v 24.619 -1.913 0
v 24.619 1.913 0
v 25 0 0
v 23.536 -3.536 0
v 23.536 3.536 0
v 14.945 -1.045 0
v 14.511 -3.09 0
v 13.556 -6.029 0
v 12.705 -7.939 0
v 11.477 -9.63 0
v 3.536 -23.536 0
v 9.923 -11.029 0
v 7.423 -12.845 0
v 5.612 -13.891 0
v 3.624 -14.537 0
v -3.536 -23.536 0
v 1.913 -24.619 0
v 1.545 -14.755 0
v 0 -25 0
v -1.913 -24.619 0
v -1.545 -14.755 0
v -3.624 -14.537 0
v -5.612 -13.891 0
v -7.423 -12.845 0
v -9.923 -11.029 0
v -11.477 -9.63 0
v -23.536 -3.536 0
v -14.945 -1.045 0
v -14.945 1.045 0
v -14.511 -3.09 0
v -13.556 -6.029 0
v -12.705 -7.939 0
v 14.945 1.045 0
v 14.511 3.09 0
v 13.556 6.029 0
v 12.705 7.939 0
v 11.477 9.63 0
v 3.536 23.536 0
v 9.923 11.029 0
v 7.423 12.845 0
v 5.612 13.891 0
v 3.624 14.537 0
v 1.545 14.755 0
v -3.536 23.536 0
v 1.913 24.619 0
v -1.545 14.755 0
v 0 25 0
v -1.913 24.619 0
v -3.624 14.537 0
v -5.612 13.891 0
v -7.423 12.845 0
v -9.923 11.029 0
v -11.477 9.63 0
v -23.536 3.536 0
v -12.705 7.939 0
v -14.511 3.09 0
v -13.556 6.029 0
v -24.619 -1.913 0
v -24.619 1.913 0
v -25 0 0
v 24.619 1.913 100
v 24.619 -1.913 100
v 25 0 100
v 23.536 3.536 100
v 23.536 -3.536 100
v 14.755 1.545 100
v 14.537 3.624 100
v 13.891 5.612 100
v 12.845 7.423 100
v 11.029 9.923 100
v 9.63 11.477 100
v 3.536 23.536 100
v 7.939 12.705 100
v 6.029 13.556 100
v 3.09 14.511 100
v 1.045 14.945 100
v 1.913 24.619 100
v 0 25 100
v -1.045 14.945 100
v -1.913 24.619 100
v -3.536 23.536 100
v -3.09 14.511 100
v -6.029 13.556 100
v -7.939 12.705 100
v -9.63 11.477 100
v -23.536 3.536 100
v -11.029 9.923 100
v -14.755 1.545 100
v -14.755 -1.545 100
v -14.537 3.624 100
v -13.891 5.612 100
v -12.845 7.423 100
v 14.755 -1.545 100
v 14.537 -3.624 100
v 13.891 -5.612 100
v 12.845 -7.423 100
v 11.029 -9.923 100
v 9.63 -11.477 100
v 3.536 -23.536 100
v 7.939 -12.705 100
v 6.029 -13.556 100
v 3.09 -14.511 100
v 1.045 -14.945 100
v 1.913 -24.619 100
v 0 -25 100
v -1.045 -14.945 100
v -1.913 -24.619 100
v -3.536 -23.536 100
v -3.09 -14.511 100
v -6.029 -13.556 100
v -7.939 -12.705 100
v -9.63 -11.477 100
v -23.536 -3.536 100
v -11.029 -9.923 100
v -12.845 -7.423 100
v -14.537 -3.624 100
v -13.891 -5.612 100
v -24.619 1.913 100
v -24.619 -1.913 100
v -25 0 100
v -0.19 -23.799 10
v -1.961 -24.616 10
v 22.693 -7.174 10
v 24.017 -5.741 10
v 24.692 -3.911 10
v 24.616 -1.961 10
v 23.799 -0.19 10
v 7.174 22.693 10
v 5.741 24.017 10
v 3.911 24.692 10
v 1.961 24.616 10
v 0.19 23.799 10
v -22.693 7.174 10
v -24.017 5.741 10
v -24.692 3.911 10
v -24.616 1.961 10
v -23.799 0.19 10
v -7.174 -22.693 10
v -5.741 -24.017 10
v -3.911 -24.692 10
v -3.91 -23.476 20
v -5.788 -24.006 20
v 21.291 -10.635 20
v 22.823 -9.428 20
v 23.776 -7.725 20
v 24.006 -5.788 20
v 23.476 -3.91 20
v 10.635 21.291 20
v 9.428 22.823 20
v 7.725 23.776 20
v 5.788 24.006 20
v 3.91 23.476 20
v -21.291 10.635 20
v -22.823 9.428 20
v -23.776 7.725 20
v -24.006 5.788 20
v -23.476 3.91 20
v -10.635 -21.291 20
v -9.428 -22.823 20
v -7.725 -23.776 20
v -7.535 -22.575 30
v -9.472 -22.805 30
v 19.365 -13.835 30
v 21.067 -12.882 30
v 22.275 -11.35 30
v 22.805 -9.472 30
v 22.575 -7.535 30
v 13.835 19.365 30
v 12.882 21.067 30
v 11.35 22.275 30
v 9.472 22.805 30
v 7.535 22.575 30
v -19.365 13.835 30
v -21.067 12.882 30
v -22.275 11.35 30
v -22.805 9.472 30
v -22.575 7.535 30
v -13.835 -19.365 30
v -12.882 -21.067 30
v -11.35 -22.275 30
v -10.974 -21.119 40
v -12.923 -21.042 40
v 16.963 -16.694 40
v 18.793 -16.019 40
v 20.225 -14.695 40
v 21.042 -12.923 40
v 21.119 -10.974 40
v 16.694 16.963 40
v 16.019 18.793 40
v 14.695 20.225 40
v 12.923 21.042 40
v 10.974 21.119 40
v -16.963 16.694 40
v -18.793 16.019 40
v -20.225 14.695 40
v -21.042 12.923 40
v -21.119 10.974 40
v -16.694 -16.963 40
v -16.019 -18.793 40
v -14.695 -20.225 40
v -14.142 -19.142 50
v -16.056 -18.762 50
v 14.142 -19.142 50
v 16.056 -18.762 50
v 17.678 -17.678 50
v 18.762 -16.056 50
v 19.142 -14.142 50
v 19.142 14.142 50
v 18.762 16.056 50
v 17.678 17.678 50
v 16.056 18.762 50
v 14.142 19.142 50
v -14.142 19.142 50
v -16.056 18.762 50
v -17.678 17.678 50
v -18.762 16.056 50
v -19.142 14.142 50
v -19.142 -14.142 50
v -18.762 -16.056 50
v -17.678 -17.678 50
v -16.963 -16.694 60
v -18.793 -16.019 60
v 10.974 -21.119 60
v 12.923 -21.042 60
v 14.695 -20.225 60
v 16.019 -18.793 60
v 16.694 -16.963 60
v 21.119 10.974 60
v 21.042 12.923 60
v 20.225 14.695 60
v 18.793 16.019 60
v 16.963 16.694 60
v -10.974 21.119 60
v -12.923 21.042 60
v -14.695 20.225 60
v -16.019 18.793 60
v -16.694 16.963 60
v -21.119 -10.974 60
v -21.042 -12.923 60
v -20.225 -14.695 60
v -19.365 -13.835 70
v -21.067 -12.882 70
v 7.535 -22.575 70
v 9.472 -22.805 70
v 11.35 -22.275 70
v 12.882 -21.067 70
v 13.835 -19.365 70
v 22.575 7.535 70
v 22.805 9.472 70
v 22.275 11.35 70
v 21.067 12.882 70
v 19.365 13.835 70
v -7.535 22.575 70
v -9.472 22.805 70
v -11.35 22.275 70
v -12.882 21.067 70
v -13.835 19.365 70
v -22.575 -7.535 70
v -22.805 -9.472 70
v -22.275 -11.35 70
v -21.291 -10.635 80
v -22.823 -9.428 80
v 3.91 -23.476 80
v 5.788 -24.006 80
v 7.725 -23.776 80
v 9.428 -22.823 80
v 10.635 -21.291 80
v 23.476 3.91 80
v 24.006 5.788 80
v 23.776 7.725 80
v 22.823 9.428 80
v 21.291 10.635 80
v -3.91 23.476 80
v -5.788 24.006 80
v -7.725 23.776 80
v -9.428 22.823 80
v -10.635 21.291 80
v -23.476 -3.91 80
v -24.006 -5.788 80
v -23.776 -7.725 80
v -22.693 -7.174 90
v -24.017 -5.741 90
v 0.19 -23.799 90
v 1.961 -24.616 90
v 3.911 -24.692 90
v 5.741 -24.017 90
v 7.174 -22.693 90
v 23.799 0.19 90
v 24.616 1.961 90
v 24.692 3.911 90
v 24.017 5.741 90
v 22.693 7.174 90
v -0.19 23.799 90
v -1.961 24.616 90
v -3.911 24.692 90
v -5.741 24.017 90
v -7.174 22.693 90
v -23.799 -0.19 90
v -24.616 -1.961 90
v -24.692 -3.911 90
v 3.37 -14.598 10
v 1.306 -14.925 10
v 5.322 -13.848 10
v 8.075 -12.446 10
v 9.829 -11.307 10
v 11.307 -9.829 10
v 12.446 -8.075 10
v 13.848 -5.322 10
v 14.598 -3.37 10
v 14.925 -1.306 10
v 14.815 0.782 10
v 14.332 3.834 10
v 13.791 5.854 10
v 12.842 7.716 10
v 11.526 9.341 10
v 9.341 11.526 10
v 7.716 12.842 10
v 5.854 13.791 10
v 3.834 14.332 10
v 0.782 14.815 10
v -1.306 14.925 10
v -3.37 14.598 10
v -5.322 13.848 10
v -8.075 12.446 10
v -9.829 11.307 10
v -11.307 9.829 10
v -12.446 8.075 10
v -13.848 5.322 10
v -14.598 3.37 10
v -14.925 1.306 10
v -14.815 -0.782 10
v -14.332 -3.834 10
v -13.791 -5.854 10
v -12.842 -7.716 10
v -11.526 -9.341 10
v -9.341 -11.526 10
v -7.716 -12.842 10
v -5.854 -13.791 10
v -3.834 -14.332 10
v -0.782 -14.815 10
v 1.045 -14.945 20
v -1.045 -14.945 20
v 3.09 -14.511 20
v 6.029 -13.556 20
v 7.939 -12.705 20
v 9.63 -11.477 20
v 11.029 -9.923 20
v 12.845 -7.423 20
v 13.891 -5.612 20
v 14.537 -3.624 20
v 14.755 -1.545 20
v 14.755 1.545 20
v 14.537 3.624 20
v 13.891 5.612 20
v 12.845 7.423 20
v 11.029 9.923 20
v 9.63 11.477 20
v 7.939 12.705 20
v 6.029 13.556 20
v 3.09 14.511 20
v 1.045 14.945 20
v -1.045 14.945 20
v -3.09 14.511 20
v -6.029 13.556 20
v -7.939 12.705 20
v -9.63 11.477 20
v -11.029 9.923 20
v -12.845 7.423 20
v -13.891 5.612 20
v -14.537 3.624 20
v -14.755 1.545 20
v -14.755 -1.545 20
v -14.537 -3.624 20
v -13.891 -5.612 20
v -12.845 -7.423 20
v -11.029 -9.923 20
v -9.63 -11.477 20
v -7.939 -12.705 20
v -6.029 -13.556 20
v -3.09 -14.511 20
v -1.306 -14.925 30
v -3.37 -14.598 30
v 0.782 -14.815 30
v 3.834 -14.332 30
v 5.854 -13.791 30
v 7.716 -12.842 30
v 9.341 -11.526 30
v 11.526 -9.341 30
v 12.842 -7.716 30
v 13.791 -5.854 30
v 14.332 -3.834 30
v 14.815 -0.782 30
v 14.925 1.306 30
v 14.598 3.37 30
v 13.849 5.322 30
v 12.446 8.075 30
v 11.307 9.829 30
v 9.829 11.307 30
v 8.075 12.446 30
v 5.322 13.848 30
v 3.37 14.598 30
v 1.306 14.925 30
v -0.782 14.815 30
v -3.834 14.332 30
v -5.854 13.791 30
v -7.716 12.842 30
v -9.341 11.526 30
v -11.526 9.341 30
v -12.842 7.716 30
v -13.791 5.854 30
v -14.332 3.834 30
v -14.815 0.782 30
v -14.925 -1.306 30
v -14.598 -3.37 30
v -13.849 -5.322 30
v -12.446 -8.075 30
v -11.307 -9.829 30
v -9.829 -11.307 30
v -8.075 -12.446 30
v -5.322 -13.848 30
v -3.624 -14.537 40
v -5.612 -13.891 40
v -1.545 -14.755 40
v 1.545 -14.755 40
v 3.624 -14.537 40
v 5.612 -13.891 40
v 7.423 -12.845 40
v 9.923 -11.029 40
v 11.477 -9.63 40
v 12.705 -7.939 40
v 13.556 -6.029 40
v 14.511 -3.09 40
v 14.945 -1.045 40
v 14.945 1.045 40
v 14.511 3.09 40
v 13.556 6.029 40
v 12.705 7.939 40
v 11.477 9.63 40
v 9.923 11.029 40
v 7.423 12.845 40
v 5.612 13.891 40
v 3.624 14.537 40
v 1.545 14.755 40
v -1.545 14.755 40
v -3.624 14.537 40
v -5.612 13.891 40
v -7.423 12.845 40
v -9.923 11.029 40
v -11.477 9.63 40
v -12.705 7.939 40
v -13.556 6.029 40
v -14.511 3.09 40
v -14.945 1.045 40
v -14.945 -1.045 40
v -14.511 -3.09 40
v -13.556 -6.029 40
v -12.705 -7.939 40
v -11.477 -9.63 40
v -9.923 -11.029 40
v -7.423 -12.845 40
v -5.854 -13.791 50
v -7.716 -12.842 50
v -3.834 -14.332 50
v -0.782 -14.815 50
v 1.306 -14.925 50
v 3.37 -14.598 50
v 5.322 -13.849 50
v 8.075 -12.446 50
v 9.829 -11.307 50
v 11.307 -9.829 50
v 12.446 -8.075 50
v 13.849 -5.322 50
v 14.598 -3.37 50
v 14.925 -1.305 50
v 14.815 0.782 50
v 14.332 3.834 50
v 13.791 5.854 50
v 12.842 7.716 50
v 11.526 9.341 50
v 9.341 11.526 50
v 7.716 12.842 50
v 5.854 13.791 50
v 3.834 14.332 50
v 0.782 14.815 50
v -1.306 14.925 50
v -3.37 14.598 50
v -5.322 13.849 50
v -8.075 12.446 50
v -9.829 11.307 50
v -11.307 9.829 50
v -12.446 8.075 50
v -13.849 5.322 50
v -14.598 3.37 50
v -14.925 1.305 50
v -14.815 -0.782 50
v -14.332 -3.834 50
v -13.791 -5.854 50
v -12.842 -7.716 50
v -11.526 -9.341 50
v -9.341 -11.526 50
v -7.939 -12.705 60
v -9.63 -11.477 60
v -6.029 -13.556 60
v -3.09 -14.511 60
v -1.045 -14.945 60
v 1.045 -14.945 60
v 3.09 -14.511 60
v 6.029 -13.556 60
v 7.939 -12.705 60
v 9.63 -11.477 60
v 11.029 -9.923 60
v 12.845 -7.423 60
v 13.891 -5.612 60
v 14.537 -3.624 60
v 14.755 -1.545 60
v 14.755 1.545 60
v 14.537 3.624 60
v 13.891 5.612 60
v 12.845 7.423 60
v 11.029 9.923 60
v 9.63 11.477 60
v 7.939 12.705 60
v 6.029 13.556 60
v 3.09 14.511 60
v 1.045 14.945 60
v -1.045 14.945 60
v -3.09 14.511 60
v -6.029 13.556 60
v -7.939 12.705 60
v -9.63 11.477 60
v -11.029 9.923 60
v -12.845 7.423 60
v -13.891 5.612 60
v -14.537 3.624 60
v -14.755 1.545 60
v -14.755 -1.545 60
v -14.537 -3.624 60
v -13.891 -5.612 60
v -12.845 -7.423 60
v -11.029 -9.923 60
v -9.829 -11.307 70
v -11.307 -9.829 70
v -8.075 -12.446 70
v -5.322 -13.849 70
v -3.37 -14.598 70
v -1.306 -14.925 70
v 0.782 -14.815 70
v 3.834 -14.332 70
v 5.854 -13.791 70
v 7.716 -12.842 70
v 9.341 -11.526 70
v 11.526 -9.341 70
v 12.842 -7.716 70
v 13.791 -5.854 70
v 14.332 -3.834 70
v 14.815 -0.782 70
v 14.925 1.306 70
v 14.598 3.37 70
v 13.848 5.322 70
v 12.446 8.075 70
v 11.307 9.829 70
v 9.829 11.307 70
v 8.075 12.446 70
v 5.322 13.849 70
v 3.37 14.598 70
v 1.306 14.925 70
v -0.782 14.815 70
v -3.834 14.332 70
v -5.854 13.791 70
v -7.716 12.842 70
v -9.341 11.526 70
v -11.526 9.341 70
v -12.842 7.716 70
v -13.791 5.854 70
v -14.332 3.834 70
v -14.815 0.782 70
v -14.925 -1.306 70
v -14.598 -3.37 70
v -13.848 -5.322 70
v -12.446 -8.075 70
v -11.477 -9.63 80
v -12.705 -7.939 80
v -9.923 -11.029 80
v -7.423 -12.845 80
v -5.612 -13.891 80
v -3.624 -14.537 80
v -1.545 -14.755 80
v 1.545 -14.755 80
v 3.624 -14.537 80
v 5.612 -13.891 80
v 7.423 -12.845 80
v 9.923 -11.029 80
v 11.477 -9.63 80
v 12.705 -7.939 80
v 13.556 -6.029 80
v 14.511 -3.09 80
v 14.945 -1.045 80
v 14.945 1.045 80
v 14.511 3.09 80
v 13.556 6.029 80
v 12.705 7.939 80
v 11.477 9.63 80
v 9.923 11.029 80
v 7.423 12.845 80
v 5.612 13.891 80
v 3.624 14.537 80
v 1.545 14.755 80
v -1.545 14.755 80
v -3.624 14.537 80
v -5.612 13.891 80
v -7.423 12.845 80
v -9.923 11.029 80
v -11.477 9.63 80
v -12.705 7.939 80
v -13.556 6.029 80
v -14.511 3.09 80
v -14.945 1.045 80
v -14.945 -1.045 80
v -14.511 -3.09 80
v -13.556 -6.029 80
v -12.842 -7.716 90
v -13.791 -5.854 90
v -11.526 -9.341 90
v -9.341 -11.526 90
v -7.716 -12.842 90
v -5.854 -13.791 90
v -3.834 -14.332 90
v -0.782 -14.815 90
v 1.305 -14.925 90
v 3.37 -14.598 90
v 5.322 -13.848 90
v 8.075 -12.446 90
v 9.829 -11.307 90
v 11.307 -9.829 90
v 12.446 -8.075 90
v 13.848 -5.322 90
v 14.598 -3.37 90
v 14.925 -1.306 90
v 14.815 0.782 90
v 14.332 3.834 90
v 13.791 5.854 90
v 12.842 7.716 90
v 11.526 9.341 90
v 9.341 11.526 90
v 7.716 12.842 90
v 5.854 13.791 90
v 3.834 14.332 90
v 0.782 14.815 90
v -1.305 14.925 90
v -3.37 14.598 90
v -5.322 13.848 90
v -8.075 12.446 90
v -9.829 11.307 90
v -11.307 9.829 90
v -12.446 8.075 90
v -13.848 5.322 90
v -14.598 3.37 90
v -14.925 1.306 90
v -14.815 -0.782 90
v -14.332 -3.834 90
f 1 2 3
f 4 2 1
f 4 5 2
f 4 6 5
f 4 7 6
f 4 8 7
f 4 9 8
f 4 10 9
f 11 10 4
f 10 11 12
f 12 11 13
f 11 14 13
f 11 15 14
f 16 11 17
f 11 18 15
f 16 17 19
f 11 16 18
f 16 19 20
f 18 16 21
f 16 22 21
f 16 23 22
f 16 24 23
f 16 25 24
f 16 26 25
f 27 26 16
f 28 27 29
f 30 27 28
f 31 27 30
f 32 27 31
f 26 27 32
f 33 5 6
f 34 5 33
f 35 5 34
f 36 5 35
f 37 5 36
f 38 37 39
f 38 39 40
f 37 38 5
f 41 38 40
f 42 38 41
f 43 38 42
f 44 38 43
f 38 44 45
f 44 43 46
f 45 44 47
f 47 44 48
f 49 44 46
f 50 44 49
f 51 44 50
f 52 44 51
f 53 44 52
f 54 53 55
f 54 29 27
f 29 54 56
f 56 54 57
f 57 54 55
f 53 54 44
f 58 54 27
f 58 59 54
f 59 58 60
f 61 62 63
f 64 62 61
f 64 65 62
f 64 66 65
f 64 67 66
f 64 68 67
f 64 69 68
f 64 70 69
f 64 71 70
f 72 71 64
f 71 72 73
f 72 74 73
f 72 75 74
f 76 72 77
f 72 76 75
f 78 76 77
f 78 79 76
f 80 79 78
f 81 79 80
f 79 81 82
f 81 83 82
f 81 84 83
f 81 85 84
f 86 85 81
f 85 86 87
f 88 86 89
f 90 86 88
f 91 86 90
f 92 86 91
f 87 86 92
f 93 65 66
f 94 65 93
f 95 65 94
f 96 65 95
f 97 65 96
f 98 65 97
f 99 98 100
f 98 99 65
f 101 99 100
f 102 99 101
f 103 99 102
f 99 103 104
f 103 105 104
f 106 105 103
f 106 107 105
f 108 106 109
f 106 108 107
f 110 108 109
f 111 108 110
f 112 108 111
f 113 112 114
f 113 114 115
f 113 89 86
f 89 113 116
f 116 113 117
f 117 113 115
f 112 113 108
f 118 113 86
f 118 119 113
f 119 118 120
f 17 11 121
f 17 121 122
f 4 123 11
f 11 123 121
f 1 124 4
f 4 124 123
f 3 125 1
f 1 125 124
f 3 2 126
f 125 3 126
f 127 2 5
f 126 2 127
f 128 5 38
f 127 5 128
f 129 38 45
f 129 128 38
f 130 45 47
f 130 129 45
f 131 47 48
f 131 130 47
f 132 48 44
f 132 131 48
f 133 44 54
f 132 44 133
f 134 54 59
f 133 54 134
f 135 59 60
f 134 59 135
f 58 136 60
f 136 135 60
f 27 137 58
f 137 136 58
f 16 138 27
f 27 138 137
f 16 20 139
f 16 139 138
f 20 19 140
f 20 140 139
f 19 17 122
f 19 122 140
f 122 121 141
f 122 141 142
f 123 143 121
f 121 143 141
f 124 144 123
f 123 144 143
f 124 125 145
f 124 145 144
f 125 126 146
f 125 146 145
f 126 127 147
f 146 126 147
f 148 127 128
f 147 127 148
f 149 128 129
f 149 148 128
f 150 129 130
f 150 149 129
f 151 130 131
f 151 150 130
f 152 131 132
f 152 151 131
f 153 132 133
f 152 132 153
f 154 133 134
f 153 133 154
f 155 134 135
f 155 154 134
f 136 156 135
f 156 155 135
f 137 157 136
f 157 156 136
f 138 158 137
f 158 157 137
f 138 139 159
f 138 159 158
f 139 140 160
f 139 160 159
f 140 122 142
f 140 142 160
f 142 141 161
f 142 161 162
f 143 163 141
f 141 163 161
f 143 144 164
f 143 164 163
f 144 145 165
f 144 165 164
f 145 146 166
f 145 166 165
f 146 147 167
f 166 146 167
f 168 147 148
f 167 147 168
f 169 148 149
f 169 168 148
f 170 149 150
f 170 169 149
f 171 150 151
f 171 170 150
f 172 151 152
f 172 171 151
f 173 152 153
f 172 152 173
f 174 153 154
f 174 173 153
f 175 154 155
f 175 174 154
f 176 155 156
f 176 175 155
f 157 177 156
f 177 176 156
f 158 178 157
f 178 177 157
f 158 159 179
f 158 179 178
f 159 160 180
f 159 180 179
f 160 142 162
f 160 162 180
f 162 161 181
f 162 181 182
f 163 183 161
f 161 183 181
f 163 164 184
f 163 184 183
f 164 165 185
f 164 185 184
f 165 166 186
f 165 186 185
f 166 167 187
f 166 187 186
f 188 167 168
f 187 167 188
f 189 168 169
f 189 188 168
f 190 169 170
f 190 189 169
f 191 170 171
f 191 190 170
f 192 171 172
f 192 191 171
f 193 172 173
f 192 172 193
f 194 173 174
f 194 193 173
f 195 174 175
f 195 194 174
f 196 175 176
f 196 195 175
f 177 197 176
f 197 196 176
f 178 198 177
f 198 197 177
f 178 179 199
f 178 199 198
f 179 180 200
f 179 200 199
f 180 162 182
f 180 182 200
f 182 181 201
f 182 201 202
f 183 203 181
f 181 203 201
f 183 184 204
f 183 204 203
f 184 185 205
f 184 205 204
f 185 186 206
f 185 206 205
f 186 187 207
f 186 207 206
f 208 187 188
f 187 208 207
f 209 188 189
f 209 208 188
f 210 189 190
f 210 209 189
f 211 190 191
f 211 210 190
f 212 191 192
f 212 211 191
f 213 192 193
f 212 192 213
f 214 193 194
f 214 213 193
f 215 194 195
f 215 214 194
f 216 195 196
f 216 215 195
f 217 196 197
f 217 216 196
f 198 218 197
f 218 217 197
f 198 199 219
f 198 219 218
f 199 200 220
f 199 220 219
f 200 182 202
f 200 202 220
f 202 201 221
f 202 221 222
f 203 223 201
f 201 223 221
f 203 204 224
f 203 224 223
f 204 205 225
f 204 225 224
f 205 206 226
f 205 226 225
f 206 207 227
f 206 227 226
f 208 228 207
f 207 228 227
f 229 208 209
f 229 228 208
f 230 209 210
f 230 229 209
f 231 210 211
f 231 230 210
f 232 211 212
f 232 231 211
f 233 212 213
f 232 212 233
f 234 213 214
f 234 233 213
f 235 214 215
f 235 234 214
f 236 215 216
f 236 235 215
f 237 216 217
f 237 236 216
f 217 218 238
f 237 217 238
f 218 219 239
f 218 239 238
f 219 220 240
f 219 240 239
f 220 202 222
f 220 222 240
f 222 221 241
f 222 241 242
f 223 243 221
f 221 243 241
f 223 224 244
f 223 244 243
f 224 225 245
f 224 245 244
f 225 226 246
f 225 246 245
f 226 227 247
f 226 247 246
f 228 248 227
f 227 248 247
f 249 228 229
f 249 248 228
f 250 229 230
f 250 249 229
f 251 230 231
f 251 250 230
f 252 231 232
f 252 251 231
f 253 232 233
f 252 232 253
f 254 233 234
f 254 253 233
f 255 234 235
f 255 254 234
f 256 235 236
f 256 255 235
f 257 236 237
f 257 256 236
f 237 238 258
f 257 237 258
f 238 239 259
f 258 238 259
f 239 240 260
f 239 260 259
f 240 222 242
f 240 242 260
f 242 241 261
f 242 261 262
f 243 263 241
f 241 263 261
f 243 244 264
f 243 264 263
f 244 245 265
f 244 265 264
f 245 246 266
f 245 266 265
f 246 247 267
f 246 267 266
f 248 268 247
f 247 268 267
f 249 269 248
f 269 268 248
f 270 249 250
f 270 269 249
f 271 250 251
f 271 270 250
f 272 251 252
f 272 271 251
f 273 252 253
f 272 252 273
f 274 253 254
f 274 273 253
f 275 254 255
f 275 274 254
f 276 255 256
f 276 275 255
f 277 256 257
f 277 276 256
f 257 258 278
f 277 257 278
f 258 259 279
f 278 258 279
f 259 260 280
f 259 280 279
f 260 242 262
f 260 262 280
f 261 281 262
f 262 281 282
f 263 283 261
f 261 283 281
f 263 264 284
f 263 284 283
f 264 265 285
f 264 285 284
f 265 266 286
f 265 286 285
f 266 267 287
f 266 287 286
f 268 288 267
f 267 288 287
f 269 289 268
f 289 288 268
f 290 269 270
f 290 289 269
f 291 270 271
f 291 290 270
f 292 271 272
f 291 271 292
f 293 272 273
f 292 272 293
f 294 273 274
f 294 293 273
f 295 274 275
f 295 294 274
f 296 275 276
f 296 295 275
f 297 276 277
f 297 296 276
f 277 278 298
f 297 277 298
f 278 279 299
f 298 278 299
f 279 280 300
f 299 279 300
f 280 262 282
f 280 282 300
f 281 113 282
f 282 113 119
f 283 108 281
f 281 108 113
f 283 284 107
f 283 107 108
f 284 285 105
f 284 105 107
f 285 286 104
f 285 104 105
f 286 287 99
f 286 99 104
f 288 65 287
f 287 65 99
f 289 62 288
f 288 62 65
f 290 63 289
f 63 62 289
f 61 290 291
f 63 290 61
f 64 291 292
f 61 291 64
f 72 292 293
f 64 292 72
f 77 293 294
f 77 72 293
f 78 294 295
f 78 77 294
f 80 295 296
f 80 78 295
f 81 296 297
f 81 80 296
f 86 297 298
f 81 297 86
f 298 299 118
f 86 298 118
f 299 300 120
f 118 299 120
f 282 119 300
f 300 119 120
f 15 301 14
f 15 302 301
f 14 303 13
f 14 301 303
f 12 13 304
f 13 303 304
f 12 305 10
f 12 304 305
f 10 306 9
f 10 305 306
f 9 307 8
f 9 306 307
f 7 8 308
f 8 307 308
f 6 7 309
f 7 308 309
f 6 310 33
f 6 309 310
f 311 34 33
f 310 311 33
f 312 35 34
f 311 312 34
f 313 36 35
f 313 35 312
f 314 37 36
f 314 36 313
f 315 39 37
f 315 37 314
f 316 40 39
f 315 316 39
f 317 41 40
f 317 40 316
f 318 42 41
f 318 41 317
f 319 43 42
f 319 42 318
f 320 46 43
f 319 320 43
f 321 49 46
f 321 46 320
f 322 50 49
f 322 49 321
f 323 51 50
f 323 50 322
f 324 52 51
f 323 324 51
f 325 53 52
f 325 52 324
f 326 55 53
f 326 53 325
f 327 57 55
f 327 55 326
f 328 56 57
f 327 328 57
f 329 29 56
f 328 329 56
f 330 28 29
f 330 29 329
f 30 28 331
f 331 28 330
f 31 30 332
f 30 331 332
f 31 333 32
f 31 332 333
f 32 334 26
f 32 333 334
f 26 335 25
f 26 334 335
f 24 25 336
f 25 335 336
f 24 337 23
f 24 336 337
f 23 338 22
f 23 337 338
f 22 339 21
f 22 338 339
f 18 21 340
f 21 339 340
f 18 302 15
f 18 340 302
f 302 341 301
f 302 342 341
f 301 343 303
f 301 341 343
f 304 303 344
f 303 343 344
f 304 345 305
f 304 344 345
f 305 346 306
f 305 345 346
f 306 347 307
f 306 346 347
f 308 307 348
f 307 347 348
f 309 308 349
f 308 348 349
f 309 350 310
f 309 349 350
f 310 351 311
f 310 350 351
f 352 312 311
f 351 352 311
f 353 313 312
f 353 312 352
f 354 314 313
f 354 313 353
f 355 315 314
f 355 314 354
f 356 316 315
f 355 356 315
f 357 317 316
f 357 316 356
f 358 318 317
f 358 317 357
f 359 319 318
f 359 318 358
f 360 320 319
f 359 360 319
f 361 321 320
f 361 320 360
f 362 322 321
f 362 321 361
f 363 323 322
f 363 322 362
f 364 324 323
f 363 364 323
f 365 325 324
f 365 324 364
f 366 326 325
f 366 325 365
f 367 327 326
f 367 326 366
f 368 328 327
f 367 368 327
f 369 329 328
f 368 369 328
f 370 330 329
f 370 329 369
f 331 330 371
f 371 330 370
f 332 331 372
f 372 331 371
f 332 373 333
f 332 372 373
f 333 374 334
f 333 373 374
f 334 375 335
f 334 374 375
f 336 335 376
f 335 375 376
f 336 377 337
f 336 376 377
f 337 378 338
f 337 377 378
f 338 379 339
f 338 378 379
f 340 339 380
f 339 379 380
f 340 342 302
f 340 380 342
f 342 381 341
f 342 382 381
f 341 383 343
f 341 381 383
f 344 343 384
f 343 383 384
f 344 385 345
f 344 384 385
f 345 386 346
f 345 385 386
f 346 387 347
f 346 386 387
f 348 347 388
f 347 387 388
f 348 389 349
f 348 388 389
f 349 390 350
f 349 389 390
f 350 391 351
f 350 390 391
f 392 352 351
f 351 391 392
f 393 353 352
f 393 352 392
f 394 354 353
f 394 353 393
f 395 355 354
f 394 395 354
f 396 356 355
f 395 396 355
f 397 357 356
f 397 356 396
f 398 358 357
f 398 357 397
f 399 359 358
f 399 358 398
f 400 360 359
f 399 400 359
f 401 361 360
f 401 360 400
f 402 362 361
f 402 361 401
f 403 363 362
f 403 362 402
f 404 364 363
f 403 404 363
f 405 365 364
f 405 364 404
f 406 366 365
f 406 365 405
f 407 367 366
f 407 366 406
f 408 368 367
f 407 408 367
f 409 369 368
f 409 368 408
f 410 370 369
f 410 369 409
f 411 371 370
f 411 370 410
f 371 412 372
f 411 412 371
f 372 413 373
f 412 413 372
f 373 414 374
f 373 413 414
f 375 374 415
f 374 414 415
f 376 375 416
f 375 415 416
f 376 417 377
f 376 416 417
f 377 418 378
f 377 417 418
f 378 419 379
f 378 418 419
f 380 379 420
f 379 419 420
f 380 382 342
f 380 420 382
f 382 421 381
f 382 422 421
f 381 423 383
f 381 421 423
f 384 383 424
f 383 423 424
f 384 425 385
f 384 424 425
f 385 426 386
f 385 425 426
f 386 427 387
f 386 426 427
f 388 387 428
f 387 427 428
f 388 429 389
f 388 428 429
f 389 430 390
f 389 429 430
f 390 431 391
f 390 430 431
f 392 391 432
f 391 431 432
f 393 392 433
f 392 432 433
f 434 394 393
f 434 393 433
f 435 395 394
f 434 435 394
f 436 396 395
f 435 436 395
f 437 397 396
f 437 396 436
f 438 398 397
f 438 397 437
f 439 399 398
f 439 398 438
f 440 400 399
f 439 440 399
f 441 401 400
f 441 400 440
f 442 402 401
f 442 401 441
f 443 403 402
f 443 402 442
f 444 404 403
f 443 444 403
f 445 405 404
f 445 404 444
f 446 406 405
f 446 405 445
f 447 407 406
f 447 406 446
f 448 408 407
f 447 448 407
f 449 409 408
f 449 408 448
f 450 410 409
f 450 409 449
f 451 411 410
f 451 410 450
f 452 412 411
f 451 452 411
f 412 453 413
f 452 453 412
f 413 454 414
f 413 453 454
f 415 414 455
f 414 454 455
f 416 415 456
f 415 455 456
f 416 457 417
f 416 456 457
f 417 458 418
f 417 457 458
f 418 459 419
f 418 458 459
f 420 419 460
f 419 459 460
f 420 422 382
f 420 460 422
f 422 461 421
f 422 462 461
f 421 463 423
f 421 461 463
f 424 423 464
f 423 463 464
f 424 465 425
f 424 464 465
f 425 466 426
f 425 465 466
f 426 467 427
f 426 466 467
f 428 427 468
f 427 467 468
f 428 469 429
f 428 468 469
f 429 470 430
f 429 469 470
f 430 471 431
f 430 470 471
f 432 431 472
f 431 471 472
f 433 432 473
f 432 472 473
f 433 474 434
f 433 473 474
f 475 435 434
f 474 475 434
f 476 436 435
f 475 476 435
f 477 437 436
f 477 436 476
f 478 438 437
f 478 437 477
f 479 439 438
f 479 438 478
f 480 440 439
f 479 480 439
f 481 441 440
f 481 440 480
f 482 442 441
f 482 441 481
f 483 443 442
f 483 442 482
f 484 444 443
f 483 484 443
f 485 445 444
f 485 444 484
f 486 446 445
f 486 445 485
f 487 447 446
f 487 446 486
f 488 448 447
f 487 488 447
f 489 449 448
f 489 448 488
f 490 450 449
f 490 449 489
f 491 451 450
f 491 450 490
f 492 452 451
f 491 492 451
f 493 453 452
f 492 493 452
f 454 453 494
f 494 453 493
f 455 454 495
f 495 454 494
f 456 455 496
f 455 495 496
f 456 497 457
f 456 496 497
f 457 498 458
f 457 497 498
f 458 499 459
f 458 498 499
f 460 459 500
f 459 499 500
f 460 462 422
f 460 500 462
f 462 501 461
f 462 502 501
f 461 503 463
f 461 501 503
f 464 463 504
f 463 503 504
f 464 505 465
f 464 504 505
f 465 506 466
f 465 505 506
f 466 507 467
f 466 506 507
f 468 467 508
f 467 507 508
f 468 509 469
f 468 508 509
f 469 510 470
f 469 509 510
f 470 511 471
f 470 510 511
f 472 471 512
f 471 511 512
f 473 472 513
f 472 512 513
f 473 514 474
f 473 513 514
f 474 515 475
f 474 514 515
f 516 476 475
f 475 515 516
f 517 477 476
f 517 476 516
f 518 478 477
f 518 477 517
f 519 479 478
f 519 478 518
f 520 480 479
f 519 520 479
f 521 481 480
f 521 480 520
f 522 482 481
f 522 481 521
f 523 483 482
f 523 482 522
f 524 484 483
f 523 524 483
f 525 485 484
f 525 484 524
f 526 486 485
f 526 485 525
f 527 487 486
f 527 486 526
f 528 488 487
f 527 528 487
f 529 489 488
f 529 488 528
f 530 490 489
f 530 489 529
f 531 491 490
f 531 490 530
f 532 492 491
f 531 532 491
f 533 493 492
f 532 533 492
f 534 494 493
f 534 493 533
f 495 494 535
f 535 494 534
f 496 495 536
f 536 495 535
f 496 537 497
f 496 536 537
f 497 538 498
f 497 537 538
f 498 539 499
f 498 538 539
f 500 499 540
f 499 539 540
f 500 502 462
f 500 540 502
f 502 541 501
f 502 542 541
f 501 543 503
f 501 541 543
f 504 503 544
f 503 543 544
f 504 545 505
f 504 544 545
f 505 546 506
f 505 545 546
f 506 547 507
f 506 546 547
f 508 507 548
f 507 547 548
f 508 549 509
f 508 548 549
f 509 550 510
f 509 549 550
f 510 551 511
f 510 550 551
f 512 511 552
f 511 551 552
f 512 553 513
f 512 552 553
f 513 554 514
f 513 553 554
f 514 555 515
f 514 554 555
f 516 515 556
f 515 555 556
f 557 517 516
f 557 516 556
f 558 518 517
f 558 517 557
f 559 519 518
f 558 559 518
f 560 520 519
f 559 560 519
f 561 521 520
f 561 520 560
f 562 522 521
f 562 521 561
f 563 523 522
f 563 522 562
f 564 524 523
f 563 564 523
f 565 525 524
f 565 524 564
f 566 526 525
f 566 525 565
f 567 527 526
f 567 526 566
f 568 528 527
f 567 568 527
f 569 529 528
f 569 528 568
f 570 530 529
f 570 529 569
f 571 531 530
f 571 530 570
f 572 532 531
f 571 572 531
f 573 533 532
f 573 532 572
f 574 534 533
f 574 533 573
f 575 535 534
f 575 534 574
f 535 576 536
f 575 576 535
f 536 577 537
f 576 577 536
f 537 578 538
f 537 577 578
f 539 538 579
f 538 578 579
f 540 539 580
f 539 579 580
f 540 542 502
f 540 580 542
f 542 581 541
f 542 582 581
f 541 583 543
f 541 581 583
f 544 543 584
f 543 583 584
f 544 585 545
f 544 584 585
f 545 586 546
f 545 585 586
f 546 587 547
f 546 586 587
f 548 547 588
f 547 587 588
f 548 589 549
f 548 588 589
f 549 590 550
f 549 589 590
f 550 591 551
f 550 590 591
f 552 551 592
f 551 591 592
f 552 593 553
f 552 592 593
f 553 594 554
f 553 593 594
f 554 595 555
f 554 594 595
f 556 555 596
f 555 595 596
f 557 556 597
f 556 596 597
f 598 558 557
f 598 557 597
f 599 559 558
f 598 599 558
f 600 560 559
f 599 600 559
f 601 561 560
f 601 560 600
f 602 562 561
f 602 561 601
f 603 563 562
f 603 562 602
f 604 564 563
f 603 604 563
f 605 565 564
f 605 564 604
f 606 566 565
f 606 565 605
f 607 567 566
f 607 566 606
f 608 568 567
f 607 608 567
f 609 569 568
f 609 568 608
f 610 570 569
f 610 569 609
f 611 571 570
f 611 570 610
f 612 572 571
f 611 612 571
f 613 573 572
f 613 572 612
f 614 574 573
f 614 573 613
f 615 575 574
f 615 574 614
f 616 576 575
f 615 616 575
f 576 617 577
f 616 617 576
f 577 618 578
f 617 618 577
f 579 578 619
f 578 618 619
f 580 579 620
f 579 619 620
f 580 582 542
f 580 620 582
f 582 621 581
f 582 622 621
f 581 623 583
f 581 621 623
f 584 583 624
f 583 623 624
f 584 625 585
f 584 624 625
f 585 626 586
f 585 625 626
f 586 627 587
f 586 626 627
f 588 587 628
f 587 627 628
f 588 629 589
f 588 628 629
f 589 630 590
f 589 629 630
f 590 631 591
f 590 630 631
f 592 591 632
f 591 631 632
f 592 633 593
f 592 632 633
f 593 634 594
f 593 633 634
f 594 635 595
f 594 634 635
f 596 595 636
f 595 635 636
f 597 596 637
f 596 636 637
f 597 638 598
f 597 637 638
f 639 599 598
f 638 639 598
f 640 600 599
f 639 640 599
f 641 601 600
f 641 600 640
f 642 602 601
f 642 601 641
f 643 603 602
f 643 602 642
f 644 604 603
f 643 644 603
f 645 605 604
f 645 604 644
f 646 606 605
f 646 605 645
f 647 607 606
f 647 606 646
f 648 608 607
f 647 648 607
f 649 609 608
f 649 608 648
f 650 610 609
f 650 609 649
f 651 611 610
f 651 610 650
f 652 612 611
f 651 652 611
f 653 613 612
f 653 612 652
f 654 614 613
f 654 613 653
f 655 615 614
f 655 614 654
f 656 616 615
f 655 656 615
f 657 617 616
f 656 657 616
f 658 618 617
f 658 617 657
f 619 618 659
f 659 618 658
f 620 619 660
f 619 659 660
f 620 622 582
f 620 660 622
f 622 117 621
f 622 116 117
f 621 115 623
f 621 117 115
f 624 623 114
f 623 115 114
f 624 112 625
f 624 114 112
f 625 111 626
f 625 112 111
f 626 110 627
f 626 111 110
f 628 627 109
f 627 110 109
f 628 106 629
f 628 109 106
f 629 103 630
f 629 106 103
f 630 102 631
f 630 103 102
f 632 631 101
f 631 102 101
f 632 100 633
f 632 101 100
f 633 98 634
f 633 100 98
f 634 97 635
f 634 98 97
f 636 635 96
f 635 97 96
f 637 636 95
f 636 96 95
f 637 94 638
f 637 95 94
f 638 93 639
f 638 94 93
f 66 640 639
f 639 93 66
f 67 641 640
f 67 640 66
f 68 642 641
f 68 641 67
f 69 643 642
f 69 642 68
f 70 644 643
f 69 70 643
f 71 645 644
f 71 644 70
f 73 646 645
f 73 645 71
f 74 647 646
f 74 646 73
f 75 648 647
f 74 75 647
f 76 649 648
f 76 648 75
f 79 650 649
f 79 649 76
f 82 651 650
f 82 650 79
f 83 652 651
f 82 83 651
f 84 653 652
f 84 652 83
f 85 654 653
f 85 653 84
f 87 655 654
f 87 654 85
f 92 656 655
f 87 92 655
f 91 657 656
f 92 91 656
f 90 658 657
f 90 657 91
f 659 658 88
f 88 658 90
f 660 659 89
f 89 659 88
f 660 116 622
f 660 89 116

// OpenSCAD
CupHeight =100;
TwistDegree=90;
TheSlices=10;
FilletOutside=5;
FilletInside=10;
OutsideSides=4;
InsideSides=10;
OutsideRadius=20;
InsideRadius=5;
ButtomThinkness=0;


module outsideshell(){ 
    linear_extrude(height=CupHeight,twist=TwistDegree,slices=TheSlices){
      offset(r=FilletOutside){
      translate([0,0]) circle(OutsideRadius,$fn=OutsideSides);
      }
   }
   }
       
    module insideshell(){
    linear_extrude(height=CupHeight,twist=TwistDegree,slices=TheSlices){
          offset(r = FilletInside) {
      translate([0,0]) circle(InsideRadius,$fn=InsideSides);
      }
  }
  }
  
  
 difference(){   
     translate([0,0,0]){ outsideshell();}
     translate([0,0,ButtomThinkness]) {insideshell();}
 }
          
